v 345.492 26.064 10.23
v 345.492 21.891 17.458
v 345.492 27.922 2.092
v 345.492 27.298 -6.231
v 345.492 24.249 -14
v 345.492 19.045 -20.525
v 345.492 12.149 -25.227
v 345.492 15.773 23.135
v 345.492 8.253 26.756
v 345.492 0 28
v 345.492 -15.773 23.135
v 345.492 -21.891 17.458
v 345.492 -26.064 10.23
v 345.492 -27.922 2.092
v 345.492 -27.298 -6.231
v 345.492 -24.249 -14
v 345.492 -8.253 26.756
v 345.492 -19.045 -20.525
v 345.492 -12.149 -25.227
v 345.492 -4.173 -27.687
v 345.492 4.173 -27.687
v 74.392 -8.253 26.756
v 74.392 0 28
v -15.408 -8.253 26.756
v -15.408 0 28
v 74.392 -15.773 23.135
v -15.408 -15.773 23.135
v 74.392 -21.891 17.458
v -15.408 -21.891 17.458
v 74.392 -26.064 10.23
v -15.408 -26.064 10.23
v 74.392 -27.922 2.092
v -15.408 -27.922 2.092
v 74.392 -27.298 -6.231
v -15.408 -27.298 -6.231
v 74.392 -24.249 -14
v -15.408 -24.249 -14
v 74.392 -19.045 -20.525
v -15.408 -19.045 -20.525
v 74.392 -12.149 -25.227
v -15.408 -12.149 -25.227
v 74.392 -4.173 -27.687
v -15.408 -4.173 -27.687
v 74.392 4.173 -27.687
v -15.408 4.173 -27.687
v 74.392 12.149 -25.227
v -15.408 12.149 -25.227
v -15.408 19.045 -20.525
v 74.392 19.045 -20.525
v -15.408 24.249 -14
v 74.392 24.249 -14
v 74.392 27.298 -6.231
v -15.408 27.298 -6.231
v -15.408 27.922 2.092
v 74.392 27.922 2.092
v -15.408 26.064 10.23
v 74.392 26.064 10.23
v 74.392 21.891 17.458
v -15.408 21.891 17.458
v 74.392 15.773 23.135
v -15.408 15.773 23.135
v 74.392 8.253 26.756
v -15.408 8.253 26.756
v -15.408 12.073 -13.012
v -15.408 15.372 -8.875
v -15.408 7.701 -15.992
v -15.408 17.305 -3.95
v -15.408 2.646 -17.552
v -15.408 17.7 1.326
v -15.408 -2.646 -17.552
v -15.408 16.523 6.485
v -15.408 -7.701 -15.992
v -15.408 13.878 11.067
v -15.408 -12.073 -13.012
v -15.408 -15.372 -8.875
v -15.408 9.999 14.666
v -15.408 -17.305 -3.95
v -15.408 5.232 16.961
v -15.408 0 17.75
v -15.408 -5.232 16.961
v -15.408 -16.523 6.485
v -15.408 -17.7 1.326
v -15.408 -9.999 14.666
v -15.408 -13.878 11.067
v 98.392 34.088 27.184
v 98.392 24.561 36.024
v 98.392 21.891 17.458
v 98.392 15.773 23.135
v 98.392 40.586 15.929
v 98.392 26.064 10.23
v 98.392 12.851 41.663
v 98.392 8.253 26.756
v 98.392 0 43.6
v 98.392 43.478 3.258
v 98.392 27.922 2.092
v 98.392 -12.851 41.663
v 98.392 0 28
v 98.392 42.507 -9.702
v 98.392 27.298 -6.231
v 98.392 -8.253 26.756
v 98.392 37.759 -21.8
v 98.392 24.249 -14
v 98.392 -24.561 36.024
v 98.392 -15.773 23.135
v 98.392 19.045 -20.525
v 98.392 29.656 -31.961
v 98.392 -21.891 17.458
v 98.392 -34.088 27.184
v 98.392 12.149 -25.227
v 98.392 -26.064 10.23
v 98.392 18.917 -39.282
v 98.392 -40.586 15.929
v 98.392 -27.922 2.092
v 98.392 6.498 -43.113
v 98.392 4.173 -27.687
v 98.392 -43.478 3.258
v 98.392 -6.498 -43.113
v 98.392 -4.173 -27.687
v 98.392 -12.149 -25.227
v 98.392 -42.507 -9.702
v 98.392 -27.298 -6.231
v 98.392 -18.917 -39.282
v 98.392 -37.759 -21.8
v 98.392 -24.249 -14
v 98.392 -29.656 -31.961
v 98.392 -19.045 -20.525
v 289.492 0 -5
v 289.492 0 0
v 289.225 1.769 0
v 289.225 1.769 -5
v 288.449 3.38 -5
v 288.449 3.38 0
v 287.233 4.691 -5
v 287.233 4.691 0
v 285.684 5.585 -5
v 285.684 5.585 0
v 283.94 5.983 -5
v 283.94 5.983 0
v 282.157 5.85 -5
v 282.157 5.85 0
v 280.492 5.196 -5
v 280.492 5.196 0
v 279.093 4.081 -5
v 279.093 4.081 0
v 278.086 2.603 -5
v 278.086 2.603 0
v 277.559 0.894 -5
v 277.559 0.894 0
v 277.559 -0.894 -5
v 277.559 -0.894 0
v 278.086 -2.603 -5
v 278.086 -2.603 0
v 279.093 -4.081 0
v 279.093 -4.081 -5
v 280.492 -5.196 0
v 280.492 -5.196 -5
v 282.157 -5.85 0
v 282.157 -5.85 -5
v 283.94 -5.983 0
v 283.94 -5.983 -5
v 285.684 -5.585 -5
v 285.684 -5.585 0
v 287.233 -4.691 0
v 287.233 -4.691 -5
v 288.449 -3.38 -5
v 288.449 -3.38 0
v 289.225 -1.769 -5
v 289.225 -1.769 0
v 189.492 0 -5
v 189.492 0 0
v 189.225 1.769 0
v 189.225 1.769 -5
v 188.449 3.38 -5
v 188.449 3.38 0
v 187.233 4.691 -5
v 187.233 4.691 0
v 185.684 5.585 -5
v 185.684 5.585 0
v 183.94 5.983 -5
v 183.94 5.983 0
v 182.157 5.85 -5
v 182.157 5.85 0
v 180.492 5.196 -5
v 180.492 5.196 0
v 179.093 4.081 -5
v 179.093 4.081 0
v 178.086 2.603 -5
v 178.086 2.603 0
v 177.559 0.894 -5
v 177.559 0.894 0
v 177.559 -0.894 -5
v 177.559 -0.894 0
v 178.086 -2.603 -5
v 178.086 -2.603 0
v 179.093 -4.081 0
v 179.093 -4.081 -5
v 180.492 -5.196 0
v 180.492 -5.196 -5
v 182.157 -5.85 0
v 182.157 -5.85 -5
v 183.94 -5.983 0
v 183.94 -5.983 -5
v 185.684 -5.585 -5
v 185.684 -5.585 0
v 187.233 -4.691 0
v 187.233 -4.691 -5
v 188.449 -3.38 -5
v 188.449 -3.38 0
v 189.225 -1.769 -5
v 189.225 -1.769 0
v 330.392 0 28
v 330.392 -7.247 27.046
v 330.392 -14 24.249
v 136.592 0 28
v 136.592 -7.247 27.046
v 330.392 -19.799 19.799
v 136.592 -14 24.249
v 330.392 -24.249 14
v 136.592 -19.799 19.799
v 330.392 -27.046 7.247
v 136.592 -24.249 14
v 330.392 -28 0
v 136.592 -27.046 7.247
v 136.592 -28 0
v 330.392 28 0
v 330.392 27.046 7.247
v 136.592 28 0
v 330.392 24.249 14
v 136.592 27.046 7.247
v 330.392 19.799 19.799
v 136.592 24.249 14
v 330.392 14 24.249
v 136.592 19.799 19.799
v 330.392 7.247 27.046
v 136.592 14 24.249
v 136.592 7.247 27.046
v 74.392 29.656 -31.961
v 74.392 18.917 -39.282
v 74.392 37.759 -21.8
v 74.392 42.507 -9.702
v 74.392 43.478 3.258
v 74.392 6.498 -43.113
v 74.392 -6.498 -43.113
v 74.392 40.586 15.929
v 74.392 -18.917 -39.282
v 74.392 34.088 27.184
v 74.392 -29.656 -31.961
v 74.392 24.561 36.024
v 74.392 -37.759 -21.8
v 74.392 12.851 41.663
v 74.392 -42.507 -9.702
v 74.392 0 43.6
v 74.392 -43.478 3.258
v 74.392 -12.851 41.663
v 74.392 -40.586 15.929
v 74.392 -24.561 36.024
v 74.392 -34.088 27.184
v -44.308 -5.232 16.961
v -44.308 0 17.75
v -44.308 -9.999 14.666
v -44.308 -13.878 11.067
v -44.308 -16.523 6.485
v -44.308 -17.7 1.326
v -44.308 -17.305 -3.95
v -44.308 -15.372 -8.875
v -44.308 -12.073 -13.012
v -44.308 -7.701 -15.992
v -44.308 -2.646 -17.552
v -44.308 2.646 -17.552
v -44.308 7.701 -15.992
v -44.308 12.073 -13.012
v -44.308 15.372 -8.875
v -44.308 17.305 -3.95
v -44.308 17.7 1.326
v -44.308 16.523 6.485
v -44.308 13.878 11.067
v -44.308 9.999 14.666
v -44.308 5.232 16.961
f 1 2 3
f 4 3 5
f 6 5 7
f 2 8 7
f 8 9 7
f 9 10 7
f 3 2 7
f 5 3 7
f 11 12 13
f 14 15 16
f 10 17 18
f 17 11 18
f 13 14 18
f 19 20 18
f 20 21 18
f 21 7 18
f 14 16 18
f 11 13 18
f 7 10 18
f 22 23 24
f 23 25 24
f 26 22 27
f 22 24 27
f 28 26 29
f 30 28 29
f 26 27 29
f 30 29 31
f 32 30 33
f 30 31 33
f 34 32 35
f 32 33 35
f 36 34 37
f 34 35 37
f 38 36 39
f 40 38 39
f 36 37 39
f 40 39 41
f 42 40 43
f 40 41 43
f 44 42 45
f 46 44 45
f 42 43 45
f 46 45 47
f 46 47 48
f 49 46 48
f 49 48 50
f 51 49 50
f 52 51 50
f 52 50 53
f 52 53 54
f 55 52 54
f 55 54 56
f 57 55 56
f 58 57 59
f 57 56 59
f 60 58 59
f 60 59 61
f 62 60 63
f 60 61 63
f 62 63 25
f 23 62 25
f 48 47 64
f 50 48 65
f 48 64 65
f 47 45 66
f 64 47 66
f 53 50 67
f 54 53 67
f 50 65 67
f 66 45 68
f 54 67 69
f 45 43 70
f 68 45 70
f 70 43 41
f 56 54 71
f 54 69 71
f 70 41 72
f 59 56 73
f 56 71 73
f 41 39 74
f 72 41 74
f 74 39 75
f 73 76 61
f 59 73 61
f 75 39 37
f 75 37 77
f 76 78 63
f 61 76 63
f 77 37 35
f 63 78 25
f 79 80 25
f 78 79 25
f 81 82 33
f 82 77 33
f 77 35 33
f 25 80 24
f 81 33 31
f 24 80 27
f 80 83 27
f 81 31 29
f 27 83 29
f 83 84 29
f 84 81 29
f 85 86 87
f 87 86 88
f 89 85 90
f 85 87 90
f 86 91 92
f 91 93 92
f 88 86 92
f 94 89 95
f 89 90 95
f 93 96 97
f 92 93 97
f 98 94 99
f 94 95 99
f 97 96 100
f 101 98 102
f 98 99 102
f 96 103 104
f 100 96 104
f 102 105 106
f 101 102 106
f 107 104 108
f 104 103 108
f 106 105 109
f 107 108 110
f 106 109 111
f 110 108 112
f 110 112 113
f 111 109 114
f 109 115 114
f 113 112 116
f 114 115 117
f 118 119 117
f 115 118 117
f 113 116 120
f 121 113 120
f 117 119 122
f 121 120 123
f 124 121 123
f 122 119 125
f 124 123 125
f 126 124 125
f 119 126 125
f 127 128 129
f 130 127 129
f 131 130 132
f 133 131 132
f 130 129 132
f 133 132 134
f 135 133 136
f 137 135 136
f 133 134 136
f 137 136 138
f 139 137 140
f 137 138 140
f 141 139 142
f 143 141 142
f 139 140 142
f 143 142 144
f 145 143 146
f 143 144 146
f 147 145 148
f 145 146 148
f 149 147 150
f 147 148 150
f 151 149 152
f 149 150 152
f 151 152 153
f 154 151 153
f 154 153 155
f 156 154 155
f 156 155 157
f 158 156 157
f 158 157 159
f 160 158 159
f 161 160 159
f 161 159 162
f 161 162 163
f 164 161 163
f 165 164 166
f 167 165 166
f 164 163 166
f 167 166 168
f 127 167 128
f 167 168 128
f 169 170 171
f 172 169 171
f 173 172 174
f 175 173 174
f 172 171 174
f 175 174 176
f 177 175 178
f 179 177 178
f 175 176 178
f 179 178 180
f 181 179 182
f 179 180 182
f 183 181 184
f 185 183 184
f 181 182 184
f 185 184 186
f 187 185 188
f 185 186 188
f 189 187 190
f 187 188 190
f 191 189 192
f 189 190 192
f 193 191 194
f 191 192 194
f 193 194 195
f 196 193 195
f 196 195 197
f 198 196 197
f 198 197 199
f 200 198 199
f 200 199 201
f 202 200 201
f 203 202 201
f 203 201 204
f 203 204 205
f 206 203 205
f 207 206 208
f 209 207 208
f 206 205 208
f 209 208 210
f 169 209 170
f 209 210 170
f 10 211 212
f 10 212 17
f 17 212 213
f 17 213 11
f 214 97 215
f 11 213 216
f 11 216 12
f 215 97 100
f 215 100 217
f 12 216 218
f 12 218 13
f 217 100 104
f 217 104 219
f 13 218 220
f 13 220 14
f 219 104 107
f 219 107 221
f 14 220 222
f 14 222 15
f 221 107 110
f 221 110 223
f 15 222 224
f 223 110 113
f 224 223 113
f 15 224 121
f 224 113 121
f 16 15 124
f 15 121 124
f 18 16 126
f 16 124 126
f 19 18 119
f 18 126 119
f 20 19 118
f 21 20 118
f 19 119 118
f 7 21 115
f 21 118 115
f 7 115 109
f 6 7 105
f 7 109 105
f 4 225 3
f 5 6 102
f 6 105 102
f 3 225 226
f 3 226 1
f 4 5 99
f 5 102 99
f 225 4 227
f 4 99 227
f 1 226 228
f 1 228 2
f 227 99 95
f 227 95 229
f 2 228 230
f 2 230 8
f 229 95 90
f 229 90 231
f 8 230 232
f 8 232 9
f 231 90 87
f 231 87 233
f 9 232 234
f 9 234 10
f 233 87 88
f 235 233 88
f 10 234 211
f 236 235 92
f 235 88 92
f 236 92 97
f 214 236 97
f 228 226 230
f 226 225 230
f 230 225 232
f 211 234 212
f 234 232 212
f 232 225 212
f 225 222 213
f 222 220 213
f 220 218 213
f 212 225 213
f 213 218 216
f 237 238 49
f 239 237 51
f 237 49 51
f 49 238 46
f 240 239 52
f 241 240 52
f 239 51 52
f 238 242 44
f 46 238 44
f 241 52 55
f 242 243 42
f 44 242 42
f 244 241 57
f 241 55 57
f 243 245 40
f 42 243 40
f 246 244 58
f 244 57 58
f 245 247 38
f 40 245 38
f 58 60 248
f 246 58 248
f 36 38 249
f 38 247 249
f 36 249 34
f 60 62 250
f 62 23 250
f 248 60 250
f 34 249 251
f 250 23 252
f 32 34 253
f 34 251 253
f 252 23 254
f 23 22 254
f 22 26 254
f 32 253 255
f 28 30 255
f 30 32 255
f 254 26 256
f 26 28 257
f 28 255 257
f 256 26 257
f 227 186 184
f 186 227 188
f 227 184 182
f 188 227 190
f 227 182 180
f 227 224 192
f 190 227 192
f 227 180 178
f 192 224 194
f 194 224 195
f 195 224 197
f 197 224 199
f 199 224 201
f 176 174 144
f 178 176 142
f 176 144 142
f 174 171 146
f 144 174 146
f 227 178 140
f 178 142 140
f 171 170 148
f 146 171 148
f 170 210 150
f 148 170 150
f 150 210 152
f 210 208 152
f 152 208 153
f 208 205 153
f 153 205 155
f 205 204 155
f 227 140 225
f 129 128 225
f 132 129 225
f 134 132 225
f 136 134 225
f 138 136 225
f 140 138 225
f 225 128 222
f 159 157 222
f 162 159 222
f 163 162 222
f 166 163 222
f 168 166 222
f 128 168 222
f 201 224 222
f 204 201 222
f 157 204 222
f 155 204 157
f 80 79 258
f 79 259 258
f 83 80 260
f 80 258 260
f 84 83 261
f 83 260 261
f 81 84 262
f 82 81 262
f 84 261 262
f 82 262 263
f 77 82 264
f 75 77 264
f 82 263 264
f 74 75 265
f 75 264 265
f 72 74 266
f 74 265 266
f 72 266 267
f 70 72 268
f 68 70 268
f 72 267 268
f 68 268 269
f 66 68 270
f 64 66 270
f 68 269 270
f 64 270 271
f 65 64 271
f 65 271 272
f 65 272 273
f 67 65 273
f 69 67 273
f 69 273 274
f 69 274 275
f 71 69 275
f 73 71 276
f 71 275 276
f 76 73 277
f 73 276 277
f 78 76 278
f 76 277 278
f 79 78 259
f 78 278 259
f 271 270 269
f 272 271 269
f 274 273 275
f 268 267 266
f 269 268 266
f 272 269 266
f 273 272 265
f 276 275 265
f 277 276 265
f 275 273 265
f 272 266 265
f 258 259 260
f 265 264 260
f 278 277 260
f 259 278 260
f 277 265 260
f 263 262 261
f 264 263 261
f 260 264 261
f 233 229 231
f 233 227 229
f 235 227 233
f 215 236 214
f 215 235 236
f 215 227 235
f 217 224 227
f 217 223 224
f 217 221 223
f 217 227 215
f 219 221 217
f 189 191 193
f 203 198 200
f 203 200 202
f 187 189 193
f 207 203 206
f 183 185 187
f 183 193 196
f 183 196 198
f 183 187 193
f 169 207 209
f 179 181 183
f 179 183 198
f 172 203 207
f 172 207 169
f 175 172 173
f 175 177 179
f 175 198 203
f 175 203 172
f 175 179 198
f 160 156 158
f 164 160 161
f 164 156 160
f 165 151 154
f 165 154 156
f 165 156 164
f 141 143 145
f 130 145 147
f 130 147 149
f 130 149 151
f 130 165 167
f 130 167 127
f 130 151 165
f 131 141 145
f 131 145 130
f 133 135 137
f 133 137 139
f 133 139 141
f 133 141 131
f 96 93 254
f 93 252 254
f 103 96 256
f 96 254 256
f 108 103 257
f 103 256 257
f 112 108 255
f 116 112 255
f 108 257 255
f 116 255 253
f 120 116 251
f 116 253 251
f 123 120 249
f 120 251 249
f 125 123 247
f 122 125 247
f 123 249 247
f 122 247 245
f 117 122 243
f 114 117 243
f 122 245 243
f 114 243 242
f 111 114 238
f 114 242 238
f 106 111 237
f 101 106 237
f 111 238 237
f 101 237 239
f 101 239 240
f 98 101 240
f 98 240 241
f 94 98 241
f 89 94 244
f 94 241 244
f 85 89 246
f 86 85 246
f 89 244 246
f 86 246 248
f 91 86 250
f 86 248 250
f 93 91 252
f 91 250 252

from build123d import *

# Parameters (mm, degrees)
F3_W     = 193.8
F3_H     = 30.8805991608
F2_DEPTH = 65.3571831062
F4_R     = 6
F5_DEPTH = 5


with BuildPart() as f1:
    # F0 (on Front) → F1 (revolve)
    with BuildSketch(Plane.XZ):
        Polygon((-44.3082220923, 17.75), (-44.3082220923, 0), (345.4917779077, 0), (345.4917779077, 28), (98.3917779077, 28), (98.3917779077, 43.6), (74.3917779077, 43.6), (74.3917779077, 28), (-15.4082220923, 28), (-15.4082220923, 17.75), align=None)
    revolve(axis=Axis((24.5496360249, 0, 0), (1, 0, 0)))

    # F3 (on Front) → F2 (cut, symmetric)
    with BuildSketch(Plane.XZ):
        with Locations((233.4917779077, 15.4402995804)):
            Rectangle(F3_W, F3_H)
    extrude(amount=F2_DEPTH, both=True, mode=Mode.SUBTRACT)

    # F4 (on face) → F5 (cut)
    with BuildSketch(Plane.XY):
        with Locations((183.4917779077, 0)):
            Circle(F4_R)
        with Locations((283.4917779077, 0)):
            Circle(F4_R)
    extrude(amount=-F5_DEPTH, mode=Mode.SUBTRACT)


solid = f1.part
